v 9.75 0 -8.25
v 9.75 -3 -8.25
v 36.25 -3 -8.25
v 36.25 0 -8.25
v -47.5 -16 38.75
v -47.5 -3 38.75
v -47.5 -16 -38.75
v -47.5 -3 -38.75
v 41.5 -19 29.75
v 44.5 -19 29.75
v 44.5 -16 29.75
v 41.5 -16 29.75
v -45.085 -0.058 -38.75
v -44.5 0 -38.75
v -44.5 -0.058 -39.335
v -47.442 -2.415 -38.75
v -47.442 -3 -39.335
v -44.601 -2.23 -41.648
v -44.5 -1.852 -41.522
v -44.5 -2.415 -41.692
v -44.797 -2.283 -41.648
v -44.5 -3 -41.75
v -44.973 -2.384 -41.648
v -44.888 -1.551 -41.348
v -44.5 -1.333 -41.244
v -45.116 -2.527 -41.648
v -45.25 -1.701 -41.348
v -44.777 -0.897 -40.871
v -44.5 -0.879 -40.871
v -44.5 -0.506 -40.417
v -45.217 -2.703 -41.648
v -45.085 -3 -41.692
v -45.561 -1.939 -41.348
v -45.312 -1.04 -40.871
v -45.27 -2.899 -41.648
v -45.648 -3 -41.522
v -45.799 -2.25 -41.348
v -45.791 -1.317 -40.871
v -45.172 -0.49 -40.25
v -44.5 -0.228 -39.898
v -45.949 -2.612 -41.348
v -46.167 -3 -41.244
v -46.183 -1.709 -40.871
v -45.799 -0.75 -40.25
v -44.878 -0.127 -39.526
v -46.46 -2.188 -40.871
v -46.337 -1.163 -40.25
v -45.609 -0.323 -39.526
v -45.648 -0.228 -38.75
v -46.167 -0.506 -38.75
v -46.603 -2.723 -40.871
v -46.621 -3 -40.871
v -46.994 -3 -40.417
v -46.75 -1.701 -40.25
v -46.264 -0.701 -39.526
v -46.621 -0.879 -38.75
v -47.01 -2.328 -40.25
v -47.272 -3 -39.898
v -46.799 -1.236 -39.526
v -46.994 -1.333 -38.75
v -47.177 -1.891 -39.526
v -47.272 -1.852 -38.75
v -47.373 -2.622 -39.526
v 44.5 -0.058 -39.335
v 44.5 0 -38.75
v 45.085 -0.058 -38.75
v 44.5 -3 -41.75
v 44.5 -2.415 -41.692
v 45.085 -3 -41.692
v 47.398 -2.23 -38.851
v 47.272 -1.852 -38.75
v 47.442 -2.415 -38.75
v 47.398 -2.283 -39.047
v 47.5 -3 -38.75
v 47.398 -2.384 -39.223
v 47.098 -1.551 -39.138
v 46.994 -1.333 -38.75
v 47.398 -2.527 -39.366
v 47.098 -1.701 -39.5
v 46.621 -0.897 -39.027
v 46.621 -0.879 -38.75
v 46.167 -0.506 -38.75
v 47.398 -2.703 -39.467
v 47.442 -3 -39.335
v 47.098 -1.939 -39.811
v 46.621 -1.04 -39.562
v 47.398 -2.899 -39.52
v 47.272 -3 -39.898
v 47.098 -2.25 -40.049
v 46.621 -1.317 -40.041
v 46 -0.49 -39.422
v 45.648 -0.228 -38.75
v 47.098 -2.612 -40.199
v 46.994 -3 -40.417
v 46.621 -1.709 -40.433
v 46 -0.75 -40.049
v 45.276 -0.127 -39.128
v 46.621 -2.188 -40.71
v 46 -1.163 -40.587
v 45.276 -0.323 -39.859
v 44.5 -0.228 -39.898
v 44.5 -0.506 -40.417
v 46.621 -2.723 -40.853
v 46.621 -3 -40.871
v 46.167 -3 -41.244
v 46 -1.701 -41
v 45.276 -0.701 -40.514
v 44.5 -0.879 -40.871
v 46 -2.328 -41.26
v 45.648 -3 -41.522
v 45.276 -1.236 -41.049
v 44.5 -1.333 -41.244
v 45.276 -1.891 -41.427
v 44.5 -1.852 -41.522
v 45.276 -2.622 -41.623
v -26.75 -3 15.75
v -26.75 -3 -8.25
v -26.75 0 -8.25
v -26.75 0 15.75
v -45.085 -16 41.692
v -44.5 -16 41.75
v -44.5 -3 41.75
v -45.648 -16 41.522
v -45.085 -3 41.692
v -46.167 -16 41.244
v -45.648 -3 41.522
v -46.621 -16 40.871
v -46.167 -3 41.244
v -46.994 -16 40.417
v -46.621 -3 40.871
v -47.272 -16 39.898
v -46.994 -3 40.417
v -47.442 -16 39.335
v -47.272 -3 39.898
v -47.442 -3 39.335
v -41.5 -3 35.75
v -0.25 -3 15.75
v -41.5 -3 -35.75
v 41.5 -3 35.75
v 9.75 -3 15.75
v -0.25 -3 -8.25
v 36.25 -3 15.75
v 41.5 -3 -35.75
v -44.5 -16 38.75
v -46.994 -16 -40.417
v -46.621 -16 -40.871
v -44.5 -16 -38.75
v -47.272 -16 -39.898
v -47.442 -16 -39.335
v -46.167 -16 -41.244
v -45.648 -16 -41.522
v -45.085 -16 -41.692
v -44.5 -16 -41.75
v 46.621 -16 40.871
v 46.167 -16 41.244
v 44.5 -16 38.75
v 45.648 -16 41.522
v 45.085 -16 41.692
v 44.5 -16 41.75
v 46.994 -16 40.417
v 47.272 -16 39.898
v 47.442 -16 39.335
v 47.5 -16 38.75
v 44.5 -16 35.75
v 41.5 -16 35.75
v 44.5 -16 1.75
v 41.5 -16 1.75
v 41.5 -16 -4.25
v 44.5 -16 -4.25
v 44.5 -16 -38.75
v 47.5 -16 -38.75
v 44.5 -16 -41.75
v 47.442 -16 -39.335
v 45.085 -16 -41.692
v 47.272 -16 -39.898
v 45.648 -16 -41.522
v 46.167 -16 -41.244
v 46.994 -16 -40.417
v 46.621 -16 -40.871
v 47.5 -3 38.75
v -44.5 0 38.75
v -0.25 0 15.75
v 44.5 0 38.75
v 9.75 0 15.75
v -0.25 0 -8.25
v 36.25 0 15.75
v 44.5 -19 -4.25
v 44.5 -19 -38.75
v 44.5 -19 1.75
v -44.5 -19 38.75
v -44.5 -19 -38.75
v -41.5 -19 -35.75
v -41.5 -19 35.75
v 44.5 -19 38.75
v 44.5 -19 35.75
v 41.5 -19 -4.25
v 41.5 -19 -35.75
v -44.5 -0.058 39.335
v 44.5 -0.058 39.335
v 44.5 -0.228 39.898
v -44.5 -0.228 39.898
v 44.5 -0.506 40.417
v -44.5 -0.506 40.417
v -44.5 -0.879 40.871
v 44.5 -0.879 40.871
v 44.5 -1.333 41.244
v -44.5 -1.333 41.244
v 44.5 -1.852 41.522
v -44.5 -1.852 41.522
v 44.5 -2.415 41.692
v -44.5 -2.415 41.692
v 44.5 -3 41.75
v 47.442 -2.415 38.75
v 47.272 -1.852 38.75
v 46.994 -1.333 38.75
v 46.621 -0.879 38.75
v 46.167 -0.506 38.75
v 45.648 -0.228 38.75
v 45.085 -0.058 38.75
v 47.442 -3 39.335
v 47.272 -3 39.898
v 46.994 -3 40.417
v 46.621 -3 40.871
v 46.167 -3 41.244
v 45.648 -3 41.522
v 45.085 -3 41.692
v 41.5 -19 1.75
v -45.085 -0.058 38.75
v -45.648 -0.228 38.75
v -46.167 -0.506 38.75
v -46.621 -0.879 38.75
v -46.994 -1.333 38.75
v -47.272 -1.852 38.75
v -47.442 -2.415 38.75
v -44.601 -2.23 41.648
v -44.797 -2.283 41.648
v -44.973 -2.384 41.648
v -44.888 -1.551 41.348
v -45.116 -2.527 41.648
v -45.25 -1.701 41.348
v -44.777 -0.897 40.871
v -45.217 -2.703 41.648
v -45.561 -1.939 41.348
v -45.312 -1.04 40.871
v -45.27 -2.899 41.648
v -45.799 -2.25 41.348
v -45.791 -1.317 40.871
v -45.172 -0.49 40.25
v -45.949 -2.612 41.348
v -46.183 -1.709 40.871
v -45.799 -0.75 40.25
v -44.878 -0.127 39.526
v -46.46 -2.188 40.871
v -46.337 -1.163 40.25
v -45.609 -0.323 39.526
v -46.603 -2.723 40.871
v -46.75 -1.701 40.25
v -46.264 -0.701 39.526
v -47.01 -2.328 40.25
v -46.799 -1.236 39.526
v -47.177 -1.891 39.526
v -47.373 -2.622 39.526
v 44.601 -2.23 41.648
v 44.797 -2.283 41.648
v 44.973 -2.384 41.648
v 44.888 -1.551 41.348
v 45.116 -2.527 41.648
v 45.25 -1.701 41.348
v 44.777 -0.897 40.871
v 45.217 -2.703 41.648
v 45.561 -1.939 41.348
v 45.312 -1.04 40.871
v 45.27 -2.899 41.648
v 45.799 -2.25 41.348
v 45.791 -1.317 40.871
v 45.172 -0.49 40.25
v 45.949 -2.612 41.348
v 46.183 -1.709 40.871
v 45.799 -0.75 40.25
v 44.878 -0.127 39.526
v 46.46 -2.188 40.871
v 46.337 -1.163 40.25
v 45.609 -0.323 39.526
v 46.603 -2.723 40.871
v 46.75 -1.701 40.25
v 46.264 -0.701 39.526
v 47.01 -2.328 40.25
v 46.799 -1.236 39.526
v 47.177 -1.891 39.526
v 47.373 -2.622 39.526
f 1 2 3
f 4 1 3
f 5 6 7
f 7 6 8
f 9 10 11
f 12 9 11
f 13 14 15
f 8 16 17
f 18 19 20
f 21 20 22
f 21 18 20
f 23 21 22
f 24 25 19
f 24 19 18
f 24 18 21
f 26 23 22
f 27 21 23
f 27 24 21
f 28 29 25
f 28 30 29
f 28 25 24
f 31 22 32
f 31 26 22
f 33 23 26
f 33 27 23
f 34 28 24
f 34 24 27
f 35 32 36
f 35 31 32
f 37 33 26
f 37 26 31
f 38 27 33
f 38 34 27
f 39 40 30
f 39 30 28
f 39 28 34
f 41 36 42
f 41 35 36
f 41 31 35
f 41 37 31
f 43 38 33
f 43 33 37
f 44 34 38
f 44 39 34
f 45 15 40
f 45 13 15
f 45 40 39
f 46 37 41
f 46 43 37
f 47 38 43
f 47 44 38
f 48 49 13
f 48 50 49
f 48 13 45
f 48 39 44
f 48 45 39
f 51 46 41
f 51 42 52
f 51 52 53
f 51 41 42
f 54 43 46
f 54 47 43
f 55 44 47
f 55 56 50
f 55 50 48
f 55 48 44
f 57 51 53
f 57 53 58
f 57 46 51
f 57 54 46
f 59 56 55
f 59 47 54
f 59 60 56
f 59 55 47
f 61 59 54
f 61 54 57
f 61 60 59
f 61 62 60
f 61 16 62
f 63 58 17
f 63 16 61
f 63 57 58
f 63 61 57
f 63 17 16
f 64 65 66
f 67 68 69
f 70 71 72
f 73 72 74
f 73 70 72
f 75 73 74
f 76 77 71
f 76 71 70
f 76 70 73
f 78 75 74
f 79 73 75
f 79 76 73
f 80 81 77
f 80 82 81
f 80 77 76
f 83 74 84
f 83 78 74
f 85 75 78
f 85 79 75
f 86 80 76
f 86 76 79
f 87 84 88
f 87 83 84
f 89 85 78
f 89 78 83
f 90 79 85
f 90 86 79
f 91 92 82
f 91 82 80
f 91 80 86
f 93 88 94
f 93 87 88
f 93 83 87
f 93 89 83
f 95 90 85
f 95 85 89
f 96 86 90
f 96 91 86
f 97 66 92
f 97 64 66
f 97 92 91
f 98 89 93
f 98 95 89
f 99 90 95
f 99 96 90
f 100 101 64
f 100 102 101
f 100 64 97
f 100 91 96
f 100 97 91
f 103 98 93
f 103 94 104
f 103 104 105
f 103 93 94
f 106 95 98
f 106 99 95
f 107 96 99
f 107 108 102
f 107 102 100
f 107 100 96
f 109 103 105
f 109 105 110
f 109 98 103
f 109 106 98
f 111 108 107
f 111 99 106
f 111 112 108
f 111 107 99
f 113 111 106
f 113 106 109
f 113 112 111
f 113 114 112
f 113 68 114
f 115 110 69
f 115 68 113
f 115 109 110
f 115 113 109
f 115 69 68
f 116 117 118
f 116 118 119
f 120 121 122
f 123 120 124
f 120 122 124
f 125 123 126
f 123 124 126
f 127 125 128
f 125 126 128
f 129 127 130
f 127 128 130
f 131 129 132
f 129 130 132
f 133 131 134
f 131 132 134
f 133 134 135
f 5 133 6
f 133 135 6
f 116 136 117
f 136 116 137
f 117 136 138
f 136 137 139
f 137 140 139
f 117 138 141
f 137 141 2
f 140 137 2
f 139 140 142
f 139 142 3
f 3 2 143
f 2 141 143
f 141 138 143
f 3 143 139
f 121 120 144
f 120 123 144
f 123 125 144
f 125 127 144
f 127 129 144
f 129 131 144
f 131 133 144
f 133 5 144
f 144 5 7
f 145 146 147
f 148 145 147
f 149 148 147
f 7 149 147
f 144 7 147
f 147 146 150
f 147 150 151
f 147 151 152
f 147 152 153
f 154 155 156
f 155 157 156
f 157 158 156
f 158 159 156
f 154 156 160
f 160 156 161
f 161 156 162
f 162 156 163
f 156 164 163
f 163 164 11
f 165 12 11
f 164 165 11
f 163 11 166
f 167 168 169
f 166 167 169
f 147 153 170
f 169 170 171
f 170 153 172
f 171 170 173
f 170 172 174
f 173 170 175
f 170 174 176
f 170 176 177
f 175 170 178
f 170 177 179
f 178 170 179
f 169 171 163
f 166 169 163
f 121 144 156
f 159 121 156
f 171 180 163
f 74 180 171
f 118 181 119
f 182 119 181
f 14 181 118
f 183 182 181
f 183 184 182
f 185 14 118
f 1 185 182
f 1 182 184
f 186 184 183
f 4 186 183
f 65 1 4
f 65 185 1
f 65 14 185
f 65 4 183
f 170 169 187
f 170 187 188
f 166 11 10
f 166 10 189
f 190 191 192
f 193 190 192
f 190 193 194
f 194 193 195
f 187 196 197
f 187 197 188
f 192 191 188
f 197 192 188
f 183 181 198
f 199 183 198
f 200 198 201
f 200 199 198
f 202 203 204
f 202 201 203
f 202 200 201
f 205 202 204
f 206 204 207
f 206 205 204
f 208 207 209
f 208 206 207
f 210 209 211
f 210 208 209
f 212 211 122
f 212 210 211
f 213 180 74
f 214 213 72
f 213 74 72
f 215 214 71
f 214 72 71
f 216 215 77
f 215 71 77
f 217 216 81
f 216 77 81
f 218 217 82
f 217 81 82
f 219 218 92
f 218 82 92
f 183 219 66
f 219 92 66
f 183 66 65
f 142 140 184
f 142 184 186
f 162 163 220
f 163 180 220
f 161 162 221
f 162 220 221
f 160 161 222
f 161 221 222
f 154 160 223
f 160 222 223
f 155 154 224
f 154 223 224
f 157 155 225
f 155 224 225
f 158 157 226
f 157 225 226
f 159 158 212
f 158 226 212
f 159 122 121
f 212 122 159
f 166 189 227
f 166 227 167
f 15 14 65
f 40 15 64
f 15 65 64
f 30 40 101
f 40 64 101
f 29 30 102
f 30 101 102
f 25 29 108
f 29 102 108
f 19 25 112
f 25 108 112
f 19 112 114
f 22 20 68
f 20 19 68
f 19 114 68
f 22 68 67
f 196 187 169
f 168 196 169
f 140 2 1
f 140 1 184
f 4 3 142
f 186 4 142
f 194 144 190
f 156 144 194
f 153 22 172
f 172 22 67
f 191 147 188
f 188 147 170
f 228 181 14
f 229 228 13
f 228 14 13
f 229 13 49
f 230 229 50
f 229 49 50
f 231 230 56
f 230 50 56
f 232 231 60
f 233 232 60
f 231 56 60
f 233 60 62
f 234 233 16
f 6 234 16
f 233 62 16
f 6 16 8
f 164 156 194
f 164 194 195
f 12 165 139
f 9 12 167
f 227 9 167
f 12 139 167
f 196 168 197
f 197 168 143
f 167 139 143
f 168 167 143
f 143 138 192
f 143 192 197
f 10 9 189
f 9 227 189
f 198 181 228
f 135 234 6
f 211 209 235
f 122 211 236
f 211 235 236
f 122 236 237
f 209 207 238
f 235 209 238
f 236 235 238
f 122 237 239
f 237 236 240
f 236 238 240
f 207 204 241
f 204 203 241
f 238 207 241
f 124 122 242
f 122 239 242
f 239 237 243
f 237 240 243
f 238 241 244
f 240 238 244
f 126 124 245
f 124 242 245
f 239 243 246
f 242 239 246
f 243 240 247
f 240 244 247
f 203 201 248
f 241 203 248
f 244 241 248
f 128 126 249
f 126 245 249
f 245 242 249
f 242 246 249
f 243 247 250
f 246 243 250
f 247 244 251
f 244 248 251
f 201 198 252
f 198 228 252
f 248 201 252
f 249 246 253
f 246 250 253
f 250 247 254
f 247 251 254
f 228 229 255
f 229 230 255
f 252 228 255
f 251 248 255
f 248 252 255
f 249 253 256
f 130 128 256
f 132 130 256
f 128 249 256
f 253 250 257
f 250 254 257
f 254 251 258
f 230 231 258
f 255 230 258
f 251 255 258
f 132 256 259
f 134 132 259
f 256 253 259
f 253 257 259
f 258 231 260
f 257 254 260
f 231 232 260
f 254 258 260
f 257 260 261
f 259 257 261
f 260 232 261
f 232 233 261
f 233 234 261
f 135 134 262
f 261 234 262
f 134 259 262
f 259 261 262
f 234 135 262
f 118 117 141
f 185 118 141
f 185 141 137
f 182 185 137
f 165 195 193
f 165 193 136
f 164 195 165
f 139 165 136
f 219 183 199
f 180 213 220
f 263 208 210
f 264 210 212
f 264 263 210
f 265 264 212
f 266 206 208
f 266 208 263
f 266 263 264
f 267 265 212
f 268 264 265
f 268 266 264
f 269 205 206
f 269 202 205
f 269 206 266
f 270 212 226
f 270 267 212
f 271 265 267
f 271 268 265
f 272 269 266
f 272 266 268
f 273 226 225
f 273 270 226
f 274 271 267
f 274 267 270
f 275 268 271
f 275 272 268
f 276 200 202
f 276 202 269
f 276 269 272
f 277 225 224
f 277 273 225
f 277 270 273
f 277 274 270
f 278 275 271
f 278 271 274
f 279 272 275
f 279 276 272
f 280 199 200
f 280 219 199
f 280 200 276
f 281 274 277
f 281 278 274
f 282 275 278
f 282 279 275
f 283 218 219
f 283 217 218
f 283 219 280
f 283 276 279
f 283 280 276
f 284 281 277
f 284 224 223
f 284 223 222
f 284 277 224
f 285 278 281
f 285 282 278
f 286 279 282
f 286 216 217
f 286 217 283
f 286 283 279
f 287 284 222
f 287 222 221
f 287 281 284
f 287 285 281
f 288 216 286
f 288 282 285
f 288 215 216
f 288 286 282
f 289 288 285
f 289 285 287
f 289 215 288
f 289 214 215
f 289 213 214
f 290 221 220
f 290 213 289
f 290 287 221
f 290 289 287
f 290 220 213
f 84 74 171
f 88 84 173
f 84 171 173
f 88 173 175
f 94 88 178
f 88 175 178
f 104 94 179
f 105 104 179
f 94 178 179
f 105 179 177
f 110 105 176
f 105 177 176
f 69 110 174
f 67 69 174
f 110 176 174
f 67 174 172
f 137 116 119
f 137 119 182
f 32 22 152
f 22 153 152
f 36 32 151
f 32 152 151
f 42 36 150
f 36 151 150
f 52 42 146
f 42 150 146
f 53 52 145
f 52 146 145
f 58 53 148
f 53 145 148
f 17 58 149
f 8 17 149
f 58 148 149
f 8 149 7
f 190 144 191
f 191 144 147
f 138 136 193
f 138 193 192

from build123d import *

# Parameters (mm, degrees)
SKETCH1_W           = 95
SKETCH1_H           = 83.5
SKETCH1_W_2         = 89
SKETCH1_H_2         = 77.5
SKETCH1_W_3         = 83
SKETCH1_H_3         = 71.5
BOSS_EXTRUDE1_DEPTH = 3
SKETCH1_4_W         = 95
SKETCH1_4_H         = 83.5
SKETCH1_4_W_2       = 89
SKETCH1_4_H_2       = 77.5
SKETCH1_4_W_3       = 83
SKETCH1_4_H_3       = 71.5
BOSS_EXTRUDE2_DEPTH = 16
SKETCH1_5_W         = 89
SKETCH1_5_H         = 77.5
SKETCH1_5_W_2       = 83
SKETCH1_5_H_2       = 71.5
BOSS_EXTRUDE3_DEPTH = 19
FILLET1_R           = 3
SKETCH3_W           = 6
SKETCH3_H           = 6
CUT_EXTRUDE1_DEPTH  = 6
CUT_EXTRUDE2_REACH  = 5
SKETCH4_W           = 26.5
SKETCH4_H           = 24


with BuildPart() as part:
    # Sketch1 → Boss-Extrude1 (new body)
    with BuildSketch(Plane(origin=(0, 0, 0), x_dir=(1, 0, 0), z_dir=(0, 1, 0))):
        Rectangle(SKETCH1_W, SKETCH1_H)
        Rectangle(SKETCH1_W_2, SKETCH1_H_2, mode=Mode.SUBTRACT)
        Rectangle(SKETCH1_W_2, SKETCH1_H_2)
        Rectangle(SKETCH1_W_3, SKETCH1_H_3, mode=Mode.SUBTRACT)
        Rectangle(SKETCH1_W_3, SKETCH1_H_3)
    extrude(amount=-BOSS_EXTRUDE1_DEPTH)

    # Sketch1_4 → Boss-Extrude2 (add)
    with BuildSketch(Plane(origin=(0, 0, 0), x_dir=(1, 0, 0), z_dir=(0, 1, 0))):
        Rectangle(SKETCH1_4_W, SKETCH1_4_H)
        Rectangle(SKETCH1_4_W_2, SKETCH1_4_H_2, mode=Mode.SUBTRACT)
        Rectangle(SKETCH1_4_W_2, SKETCH1_4_H_2)
        Rectangle(SKETCH1_4_W_3, SKETCH1_4_H_3, mode=Mode.SUBTRACT)
    extrude(amount=-BOSS_EXTRUDE2_DEPTH)

    # Sketch1_5 → Boss-Extrude3 (add)
    with BuildSketch(Plane(origin=(0, 0, 0), x_dir=(1, 0, 0), z_dir=(0, 1, 0))):
        Rectangle(SKETCH1_5_W, SKETCH1_5_H)
        Rectangle(SKETCH1_5_W_2, SKETCH1_5_H_2, mode=Mode.SUBTRACT)
    extrude(amount=-BOSS_EXTRUDE3_DEPTH)

    # Fillet1
    fillet1_edges = [part.edges().sort_by_distance(p)[0] for p in [
        (-47.5, 0, 0),
        (0, 0, -41.75),
        (47.5, 0, 0),
        (0, 0, 41.75),
        (-47.5, -8, 41.75),
        (-47.5, -8, -41.75),
        (47.5, -8, -41.75),
        (47.5, -8, 41.75),
    ]]
    fillet(fillet1_edges, radius=FILLET1_R)

    # Sketch3 → Cut-Extrude1 (cut)
    with BuildSketch(Plane(origin=(47.5, 0, 0), x_dir=(0, 0, -1), z_dir=(1, 0, 0))):
        with Locations((-32.75, -19)):
            Rectangle(SKETCH3_W, SKETCH3_H)
        with Locations((1.25, -19)):
            Rectangle(SKETCH3_W, SKETCH3_H)
    extrude(amount=-CUT_EXTRUDE1_DEPTH, mode=Mode.SUBTRACT)

    # Sketch4 → Cut-Extrude2 (cut, up to next)
    with BuildSketch(Plane.XZ.offset(3), mode=Mode.PRIVATE) as cut_extrude2_sk1:
        with Locations((-13.5, 3.75)):
            Rectangle(SKETCH4_W, SKETCH4_H)
    cut_extrude2_tool1 = extrude(cut_extrude2_sk1.sketch, amount=-CUT_EXTRUDE2_REACH, mode=Mode.PRIVATE) & part.part
    add(cut_extrude2_tool1.solids().sort_by_distance((-13.5, -3, 3.75))[0], mode=Mode.SUBTRACT)
    # Sketch4 → Cut-Extrude2 (cut, up to next)
    with BuildSketch(Plane.XZ.offset(3), mode=Mode.PRIVATE) as cut_extrude2_sk2:
        with Locations((23, 3.75)):
            Rectangle(SKETCH4_W, SKETCH4_H)
    cut_extrude2_tool2 = extrude(cut_extrude2_sk2.sketch, amount=-CUT_EXTRUDE2_REACH, mode=Mode.PRIVATE) & part.part
    add(cut_extrude2_tool2.solids().sort_by_distance((23, -3, 3.75))[0], mode=Mode.SUBTRACT)


solid = part.part
